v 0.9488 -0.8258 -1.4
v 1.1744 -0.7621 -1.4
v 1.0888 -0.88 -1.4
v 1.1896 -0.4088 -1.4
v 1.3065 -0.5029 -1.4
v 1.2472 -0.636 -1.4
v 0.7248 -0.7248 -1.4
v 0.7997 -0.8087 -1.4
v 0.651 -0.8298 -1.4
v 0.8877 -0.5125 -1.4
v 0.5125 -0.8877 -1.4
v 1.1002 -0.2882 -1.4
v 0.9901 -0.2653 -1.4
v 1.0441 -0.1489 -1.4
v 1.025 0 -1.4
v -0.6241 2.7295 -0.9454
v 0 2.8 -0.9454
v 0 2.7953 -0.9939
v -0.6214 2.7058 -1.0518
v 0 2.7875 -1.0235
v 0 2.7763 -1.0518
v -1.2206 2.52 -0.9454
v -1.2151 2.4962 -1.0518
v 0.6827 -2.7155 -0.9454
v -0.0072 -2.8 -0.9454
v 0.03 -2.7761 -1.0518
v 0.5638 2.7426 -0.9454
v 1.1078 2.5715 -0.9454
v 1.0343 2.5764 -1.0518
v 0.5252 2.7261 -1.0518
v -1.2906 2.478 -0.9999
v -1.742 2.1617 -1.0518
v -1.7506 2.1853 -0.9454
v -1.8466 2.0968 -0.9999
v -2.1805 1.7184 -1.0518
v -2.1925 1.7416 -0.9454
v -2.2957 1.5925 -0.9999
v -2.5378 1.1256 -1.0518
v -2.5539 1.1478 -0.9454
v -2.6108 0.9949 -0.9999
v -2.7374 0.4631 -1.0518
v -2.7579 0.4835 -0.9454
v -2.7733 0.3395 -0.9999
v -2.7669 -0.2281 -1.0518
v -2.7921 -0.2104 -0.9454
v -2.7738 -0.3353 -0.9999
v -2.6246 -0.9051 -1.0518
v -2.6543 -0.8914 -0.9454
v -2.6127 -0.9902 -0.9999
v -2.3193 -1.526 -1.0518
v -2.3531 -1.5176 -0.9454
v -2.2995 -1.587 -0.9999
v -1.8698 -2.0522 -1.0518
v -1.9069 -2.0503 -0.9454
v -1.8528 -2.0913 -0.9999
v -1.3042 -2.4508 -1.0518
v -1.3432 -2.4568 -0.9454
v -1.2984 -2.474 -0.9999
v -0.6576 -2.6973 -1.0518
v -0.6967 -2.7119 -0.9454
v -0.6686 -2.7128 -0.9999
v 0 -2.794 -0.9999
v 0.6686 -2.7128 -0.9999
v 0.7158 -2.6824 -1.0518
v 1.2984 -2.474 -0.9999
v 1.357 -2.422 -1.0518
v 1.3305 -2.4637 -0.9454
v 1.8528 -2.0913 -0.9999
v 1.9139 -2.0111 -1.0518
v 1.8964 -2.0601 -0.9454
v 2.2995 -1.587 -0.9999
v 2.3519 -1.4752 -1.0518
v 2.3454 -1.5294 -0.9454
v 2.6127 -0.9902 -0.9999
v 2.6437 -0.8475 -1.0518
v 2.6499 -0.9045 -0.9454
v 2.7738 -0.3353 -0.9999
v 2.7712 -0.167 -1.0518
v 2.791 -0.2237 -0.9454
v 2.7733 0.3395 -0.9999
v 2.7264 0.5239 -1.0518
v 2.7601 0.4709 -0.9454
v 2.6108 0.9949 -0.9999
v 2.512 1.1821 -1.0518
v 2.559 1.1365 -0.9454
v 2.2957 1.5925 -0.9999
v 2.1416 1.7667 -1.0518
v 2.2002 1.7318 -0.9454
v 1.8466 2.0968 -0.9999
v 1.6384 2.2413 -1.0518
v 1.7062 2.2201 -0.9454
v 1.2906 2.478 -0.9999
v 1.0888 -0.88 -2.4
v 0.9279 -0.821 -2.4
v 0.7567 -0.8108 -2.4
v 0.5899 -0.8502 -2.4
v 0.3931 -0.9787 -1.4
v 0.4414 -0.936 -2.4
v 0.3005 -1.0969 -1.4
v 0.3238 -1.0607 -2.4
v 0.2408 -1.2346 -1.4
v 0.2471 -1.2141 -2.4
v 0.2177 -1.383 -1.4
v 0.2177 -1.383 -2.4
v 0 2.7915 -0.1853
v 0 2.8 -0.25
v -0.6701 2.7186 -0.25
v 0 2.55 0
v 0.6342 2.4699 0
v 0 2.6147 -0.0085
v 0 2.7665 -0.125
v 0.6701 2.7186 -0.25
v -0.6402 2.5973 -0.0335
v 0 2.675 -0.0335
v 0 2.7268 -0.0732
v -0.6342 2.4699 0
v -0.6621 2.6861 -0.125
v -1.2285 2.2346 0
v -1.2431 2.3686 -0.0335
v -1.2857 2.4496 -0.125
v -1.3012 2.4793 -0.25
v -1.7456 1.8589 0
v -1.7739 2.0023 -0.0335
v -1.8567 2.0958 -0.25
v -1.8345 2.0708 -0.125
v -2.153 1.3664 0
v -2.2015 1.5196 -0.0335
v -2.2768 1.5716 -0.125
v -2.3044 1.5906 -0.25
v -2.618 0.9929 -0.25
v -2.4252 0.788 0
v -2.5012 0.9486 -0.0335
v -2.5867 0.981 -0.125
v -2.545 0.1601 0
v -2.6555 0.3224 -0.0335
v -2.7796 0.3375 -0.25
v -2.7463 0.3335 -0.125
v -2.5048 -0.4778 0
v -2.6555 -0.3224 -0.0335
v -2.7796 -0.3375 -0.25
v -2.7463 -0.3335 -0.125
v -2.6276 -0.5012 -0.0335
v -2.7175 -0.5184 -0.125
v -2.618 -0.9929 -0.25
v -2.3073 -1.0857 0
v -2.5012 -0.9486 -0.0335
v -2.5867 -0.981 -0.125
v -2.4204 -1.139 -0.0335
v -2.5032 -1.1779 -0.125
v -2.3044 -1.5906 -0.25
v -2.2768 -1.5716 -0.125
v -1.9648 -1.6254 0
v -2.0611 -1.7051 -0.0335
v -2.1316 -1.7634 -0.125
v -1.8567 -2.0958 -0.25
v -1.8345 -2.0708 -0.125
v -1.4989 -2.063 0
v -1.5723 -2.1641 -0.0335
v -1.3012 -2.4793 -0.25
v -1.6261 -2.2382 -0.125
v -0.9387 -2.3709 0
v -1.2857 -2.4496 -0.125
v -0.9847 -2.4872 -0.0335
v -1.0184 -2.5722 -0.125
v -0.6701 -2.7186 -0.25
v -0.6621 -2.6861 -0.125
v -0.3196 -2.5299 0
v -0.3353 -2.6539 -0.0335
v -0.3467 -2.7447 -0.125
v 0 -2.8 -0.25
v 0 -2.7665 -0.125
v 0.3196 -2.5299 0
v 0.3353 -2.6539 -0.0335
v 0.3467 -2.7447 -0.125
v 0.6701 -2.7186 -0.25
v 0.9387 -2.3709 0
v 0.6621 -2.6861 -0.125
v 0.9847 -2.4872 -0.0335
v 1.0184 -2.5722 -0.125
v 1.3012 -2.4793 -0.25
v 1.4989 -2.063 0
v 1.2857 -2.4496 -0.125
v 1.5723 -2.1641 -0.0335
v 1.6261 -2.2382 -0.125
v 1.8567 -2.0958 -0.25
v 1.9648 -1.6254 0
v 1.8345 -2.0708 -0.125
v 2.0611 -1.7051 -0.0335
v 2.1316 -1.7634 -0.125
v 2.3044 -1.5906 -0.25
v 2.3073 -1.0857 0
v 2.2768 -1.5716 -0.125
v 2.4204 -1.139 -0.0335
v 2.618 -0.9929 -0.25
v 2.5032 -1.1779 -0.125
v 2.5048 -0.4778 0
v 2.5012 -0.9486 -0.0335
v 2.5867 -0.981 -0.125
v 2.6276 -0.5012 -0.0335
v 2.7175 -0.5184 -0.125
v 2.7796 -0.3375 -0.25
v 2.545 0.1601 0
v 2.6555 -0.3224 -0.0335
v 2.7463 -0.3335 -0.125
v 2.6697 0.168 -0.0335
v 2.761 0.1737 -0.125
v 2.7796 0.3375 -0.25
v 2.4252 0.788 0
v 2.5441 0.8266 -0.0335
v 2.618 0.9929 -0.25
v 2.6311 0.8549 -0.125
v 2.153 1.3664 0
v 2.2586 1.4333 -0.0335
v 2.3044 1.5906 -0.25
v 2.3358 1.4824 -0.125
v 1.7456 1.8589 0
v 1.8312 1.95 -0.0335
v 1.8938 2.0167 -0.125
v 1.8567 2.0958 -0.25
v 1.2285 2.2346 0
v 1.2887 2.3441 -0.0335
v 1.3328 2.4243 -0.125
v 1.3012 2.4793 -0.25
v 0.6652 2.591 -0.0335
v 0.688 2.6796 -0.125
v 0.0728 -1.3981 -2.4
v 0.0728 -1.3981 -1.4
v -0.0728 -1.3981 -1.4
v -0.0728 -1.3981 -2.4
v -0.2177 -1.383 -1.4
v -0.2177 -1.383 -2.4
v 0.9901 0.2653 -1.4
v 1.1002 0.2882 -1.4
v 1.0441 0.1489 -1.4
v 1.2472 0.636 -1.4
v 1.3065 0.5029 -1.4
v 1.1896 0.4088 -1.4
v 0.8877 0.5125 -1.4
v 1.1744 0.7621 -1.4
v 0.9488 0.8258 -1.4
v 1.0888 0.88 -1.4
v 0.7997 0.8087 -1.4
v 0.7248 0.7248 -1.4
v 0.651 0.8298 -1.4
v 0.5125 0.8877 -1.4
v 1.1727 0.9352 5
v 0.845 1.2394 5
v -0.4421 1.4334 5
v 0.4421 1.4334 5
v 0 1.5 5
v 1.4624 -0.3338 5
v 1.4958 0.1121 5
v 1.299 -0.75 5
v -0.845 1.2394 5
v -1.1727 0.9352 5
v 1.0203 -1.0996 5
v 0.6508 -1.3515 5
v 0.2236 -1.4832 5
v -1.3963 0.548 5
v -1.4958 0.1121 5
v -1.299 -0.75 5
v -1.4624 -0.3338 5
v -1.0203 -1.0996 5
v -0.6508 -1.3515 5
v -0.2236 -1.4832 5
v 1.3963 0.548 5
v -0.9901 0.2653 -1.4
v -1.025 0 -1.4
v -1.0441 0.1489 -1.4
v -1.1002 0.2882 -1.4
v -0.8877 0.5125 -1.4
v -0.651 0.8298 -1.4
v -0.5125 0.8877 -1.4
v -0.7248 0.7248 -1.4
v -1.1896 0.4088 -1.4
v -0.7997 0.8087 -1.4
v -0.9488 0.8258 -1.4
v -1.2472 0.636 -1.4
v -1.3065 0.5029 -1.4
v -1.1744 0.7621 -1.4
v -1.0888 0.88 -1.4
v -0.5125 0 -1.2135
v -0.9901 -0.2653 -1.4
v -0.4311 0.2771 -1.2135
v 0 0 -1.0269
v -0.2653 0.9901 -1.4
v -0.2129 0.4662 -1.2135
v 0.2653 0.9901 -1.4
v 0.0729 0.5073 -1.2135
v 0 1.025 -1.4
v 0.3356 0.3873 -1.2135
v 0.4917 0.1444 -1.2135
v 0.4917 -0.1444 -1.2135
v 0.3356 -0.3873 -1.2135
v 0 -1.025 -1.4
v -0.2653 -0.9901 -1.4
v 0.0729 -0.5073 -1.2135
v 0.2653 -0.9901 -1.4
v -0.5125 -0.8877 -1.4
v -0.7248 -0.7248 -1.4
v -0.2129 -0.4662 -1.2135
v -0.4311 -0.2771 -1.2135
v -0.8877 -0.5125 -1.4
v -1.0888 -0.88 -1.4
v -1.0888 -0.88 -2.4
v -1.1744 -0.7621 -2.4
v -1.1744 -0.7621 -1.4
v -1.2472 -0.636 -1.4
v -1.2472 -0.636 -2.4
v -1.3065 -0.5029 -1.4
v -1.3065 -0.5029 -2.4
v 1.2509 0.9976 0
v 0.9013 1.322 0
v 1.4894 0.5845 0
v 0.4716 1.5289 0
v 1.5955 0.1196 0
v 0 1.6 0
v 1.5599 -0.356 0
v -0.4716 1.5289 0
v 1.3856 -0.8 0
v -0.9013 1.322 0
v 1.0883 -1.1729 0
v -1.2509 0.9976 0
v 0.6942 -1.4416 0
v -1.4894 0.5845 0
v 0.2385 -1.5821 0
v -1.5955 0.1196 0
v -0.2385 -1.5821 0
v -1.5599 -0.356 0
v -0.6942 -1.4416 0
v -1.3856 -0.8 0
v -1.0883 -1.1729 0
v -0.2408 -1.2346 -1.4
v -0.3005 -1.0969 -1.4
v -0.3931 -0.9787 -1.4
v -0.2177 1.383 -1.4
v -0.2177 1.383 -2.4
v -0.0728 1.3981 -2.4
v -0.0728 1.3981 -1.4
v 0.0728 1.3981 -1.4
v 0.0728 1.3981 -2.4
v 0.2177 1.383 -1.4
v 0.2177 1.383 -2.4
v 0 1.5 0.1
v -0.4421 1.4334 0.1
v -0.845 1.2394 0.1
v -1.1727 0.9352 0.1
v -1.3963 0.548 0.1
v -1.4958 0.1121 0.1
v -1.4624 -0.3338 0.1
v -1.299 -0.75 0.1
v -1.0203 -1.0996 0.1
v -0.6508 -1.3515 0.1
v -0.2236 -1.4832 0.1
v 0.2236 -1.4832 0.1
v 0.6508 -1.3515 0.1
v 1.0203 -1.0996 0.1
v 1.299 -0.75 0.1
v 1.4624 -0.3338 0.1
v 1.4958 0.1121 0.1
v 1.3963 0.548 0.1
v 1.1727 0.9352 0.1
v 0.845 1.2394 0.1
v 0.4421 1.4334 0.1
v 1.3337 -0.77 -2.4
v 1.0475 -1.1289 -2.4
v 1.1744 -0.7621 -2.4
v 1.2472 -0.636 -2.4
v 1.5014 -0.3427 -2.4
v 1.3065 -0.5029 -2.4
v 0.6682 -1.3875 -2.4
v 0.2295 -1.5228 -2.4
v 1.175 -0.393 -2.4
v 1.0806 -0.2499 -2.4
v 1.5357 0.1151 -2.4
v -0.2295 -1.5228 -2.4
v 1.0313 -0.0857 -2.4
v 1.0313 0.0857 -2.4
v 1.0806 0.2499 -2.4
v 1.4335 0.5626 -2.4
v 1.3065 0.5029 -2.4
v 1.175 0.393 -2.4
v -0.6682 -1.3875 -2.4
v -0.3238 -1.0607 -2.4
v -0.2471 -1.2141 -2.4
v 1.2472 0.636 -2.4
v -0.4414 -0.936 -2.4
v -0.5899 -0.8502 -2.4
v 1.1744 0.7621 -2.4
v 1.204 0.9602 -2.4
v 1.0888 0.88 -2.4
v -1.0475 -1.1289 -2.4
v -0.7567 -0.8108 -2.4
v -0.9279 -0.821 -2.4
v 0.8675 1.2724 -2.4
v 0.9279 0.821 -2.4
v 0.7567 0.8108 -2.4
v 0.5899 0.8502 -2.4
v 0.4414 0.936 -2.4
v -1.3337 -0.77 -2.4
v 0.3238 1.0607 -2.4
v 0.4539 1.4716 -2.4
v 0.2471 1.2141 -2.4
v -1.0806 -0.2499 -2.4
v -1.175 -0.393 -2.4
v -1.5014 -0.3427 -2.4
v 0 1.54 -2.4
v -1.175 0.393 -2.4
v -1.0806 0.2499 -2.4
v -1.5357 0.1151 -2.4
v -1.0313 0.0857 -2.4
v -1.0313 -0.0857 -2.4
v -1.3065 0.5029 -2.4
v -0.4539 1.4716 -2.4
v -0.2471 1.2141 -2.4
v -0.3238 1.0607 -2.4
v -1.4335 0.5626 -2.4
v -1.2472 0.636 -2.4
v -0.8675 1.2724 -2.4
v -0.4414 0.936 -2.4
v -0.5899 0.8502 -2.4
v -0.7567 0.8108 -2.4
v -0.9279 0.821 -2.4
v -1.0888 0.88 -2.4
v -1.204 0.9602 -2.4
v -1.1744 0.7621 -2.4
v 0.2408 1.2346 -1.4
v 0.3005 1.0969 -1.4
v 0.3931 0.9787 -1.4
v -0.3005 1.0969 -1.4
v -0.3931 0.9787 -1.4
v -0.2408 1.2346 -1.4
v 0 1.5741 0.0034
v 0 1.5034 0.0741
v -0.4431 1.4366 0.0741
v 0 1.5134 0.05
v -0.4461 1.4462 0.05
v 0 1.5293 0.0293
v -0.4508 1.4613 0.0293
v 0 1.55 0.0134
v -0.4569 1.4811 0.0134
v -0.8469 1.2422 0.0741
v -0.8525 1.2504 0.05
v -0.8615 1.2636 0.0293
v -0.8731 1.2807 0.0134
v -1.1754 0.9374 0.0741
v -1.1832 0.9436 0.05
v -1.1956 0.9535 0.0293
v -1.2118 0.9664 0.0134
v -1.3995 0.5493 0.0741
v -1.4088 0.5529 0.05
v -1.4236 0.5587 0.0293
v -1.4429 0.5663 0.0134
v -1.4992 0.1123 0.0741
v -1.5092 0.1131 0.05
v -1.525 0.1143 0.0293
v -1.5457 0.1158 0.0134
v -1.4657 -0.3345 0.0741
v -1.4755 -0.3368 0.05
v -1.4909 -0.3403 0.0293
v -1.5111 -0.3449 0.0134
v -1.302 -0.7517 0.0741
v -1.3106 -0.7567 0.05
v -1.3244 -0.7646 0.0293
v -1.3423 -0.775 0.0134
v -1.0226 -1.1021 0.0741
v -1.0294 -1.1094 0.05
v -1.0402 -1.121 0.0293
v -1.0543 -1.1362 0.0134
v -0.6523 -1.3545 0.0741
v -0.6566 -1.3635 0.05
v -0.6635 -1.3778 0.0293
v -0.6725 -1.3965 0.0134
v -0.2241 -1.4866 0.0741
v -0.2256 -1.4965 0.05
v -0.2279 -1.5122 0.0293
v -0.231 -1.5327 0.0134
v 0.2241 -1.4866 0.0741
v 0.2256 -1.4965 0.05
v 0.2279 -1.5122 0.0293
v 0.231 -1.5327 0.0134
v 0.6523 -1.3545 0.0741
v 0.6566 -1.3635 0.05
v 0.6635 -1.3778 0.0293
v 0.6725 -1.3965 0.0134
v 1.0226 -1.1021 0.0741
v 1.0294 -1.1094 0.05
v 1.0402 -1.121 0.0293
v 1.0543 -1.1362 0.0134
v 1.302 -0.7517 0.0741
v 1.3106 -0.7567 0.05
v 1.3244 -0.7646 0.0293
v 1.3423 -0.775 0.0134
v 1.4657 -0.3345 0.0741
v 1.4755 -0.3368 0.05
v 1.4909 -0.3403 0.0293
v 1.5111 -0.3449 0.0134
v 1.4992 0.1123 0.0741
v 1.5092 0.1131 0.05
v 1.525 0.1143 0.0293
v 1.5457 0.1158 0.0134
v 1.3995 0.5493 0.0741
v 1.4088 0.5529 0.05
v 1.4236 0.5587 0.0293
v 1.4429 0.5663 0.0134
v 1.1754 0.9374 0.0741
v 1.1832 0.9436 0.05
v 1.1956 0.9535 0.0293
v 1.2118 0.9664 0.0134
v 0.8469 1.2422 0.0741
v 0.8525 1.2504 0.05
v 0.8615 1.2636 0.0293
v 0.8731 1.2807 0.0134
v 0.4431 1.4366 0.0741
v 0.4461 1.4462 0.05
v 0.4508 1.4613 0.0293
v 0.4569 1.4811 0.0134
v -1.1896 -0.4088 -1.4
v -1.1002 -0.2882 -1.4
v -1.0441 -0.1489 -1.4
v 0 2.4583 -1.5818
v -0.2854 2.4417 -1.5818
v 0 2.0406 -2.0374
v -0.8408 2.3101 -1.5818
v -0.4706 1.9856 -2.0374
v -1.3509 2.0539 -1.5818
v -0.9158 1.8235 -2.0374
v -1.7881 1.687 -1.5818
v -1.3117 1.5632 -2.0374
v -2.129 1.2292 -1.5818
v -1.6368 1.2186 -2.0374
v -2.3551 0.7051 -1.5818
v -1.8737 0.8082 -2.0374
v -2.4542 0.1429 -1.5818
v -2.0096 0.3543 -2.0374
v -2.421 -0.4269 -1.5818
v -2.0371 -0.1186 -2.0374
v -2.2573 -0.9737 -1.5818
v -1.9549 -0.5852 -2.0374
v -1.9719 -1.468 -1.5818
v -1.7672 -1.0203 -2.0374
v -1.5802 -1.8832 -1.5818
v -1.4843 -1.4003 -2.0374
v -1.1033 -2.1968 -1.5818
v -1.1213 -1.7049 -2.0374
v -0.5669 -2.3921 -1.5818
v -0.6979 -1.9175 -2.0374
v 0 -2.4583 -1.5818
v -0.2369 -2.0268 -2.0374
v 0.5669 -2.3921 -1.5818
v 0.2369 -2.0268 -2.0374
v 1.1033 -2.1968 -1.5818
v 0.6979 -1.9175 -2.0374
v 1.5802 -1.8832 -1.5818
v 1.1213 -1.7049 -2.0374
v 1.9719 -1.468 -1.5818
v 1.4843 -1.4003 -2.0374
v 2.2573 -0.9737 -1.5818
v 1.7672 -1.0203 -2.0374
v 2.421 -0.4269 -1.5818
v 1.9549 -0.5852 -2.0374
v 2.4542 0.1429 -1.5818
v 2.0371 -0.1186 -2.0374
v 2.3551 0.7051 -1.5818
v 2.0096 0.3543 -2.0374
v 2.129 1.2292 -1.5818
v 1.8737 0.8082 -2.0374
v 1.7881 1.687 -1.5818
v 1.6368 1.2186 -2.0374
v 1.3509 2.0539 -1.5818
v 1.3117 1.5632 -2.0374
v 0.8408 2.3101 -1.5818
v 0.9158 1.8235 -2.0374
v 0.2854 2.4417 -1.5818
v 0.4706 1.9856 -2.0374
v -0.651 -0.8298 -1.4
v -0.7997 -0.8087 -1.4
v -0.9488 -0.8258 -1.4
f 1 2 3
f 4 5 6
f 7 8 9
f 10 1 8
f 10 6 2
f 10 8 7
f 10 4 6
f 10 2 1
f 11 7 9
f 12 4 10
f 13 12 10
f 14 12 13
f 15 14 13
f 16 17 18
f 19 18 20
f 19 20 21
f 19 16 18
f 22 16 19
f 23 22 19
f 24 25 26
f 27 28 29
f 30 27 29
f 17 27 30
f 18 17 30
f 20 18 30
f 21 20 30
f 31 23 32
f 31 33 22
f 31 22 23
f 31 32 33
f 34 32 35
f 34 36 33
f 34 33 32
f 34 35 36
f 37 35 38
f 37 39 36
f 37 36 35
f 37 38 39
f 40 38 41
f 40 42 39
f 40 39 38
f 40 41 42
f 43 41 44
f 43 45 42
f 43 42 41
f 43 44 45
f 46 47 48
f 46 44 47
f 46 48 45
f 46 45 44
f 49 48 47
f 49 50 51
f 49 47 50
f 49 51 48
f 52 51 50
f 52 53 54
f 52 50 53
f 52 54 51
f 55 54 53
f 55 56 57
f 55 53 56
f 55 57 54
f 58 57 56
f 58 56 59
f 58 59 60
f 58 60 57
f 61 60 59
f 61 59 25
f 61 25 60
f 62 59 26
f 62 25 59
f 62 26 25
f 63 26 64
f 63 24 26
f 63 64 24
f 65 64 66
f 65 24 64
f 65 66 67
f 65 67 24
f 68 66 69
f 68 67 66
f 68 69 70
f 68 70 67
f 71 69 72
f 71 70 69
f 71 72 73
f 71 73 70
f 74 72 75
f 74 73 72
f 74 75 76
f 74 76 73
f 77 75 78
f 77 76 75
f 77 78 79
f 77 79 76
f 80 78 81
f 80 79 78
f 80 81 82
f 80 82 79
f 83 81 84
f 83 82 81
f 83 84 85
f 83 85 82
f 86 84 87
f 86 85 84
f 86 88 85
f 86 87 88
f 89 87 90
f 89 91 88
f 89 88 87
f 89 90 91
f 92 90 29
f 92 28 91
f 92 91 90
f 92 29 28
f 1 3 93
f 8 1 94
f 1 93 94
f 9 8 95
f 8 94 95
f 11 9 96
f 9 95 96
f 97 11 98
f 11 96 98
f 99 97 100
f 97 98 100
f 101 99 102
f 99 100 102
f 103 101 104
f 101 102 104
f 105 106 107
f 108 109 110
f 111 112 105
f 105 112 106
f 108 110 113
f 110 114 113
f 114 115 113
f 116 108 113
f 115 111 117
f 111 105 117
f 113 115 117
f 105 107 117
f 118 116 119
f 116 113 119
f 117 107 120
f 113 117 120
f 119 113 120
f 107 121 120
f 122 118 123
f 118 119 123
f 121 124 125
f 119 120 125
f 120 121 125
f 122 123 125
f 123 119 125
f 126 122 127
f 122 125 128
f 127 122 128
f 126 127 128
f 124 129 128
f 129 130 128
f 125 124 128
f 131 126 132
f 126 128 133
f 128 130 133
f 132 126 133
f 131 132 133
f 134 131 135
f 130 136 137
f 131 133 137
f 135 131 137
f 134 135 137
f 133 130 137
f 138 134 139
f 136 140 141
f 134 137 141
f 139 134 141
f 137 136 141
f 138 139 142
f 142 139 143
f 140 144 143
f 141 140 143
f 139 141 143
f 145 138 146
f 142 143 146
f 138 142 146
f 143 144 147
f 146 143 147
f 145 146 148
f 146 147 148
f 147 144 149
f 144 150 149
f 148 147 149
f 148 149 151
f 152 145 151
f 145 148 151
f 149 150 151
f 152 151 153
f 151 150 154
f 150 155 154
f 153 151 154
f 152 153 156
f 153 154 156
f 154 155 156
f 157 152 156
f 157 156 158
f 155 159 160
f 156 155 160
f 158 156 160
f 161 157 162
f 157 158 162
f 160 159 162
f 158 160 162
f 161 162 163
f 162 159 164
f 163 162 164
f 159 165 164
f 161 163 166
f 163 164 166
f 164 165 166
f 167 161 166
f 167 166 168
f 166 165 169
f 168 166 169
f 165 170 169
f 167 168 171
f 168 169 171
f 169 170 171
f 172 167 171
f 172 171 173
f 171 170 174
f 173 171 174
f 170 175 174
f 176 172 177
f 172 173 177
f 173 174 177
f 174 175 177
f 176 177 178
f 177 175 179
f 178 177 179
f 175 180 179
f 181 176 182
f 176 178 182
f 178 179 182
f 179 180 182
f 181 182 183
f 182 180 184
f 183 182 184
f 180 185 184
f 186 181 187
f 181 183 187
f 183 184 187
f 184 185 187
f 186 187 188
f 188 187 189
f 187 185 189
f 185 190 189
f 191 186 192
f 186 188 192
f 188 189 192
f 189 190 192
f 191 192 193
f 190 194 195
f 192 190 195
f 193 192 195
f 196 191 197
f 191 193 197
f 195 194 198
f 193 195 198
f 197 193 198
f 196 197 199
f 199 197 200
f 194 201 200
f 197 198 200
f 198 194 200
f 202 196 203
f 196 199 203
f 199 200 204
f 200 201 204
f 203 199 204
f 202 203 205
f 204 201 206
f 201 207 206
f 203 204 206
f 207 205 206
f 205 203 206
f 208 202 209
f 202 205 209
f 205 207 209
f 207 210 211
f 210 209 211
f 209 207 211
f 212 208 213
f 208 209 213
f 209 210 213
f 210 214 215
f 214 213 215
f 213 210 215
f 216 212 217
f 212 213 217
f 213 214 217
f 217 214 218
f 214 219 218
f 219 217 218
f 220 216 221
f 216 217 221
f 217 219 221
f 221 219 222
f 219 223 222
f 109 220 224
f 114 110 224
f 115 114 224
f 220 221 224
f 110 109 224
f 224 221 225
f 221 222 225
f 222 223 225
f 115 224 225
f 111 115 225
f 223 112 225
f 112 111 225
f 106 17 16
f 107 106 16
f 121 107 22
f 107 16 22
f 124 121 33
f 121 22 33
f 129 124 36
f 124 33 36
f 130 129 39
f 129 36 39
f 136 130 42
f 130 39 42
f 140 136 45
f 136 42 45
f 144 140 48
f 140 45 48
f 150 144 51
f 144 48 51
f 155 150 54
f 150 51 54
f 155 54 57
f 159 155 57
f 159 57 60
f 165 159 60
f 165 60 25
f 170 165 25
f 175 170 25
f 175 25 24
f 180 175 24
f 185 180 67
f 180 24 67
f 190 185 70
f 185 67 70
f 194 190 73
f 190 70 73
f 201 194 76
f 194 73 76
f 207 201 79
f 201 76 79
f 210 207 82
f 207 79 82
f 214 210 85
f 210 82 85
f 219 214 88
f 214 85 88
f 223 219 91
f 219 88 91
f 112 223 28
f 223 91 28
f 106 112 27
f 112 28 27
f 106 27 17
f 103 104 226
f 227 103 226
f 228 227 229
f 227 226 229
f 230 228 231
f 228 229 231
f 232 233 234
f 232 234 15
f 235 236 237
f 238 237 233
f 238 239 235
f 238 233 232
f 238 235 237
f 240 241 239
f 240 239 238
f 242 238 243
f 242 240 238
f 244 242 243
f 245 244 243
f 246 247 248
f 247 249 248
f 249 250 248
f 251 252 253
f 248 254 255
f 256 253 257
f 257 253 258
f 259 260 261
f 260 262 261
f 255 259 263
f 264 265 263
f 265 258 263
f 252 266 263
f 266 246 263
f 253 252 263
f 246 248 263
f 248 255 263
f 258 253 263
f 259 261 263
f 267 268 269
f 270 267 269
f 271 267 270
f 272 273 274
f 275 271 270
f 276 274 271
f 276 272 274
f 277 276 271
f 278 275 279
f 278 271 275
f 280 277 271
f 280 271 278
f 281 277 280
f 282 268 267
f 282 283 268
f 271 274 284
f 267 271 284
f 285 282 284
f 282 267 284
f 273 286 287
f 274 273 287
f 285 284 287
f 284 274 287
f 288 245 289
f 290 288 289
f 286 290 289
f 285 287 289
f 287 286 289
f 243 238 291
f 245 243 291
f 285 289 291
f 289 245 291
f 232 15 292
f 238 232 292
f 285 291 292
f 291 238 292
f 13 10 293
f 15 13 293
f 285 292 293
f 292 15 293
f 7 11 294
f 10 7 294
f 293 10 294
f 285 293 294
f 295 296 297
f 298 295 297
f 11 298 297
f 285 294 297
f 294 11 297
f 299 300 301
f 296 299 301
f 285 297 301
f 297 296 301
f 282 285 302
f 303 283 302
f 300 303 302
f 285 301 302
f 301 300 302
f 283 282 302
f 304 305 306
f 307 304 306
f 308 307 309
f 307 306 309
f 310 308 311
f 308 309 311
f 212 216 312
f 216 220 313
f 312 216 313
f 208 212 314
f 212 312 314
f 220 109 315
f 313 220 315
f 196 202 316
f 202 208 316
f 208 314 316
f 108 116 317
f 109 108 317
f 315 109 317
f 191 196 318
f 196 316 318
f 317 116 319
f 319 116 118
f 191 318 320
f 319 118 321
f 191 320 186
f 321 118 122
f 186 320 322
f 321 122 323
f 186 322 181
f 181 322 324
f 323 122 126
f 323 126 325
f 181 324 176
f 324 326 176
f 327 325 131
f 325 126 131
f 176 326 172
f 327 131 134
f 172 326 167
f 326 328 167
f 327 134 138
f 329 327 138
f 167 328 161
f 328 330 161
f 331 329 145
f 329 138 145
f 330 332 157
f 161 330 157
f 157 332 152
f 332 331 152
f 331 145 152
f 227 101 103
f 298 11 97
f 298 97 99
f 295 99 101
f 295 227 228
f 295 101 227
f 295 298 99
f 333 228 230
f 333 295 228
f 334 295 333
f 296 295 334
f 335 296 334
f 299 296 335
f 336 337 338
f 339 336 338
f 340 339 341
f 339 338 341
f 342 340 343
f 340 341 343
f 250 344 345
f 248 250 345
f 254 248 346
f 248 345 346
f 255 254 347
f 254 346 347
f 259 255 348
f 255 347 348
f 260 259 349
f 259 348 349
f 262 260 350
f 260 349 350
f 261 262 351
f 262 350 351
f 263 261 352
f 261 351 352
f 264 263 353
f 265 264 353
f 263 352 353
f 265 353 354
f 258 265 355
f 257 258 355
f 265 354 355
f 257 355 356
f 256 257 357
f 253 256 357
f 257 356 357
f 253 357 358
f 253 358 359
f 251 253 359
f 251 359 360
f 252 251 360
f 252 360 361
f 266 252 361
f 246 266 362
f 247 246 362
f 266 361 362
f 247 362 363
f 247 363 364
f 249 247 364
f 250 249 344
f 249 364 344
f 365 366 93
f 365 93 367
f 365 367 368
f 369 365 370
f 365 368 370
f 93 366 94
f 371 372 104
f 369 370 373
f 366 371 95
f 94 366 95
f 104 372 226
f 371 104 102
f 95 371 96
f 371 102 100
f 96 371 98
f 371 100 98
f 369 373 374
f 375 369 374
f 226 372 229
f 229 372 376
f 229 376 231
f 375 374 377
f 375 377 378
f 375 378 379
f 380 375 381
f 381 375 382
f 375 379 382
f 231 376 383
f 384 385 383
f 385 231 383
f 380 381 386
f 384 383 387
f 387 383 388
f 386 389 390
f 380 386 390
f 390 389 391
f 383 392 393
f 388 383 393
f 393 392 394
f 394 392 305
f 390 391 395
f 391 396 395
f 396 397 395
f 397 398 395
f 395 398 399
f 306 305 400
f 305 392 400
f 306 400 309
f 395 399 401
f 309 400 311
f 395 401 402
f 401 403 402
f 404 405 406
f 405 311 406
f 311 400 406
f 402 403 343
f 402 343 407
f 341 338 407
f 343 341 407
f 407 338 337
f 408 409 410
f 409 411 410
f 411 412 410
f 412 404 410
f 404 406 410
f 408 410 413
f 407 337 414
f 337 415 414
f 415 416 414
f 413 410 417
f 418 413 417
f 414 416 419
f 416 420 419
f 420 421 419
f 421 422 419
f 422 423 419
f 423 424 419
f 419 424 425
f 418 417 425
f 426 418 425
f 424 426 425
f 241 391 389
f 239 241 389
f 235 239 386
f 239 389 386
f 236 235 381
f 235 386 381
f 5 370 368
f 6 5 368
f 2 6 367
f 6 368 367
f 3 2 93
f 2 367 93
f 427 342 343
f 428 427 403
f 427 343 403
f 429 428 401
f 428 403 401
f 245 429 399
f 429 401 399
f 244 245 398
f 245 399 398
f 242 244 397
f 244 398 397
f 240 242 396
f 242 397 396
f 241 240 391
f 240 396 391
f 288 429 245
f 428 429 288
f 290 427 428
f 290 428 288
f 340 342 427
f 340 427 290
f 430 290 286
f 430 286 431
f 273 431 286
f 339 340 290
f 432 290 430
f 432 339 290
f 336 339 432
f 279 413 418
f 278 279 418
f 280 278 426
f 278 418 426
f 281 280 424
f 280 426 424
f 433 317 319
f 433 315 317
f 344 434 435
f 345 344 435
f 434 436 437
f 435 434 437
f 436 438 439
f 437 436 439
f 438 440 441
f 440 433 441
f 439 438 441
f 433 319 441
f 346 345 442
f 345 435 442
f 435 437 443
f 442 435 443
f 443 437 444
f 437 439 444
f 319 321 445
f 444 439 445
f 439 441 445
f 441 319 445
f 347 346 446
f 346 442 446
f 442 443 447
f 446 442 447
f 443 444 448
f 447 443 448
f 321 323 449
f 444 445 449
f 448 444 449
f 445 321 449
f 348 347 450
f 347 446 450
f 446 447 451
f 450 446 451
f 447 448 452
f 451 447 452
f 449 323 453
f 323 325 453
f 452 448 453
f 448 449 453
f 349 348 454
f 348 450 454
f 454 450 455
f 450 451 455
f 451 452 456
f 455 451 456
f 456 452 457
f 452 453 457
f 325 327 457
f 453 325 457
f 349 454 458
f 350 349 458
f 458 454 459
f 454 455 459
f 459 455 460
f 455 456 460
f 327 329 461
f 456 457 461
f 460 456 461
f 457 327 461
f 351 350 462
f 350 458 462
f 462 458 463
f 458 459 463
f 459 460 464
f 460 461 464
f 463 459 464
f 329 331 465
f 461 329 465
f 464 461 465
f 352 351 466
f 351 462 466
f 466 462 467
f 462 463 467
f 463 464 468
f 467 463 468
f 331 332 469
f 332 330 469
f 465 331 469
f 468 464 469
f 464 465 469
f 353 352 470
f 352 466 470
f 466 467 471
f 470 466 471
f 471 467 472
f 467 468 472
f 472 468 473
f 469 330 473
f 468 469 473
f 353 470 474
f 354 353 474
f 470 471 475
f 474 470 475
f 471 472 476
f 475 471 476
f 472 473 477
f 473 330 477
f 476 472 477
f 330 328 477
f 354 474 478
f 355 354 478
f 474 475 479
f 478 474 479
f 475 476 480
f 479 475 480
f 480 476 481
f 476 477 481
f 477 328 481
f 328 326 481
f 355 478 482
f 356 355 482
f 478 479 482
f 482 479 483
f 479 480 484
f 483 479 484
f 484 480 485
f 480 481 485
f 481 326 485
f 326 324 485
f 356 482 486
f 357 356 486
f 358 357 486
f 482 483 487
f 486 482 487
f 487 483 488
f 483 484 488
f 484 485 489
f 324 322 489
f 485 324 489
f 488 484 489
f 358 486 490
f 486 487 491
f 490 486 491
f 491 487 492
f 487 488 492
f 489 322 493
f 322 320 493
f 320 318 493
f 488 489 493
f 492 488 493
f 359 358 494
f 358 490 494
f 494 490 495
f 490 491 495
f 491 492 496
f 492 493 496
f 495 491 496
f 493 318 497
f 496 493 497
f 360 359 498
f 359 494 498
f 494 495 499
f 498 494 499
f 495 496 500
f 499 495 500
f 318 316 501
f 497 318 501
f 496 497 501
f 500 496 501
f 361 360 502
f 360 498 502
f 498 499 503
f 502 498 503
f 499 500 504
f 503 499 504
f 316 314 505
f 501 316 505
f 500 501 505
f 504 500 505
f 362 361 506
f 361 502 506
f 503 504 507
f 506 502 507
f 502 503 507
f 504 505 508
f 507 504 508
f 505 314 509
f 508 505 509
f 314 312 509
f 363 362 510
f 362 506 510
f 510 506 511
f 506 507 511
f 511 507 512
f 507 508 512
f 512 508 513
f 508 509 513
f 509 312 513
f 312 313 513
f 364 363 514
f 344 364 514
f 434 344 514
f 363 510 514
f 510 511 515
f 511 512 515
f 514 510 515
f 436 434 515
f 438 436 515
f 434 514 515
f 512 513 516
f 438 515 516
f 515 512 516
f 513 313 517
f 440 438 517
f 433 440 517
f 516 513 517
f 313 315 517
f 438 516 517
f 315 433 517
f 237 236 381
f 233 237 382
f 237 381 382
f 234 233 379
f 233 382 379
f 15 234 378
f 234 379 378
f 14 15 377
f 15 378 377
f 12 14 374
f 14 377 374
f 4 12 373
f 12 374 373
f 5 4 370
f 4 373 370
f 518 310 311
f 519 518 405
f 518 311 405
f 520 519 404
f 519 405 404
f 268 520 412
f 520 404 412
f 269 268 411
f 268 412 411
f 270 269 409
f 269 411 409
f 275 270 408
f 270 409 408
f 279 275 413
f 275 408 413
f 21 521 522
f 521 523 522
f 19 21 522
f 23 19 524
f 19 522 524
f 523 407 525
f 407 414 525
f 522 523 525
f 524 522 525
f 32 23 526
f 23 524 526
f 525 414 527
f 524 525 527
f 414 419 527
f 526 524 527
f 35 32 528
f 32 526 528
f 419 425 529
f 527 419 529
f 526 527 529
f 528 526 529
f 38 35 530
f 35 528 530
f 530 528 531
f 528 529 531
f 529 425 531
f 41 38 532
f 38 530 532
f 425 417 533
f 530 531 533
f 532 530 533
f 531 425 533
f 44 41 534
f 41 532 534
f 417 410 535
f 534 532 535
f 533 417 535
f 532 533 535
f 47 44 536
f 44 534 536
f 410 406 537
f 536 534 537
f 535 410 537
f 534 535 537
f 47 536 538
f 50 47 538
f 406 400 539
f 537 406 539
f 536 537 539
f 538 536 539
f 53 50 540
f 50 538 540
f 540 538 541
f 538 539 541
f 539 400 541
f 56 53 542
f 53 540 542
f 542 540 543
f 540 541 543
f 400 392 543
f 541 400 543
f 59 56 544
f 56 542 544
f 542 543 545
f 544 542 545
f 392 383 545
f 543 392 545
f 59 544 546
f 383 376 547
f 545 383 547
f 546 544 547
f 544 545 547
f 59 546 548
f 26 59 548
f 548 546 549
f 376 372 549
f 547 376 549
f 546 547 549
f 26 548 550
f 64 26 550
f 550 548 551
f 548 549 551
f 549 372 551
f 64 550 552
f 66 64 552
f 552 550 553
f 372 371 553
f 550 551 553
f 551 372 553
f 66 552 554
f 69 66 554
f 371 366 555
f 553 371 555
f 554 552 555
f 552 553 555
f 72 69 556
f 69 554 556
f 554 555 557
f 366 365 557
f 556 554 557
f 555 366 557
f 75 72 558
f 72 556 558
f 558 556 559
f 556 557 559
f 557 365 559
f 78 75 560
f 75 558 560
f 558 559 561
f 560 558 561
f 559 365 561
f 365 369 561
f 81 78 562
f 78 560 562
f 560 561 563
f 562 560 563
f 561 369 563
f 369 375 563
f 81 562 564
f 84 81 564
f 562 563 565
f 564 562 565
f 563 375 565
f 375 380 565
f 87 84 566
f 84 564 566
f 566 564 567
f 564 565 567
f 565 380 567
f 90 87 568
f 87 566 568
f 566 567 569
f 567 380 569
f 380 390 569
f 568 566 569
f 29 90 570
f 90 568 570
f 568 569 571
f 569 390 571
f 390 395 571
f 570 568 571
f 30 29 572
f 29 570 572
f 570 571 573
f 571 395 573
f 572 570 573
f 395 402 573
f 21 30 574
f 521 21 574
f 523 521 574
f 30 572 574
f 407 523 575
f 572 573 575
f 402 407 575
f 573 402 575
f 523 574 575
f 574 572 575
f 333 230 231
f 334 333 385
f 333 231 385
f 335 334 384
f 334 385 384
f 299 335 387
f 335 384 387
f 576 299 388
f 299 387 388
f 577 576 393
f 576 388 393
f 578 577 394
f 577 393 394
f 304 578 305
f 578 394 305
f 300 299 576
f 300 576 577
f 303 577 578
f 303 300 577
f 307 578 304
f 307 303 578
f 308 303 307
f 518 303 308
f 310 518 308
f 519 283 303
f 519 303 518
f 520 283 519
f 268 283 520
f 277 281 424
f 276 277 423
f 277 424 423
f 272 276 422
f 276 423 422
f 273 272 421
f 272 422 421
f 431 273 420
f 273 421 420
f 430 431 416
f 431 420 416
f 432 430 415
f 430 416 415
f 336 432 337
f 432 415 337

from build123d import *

# Parameters (mm, degrees)
FILLET1_R          = 0.1
FILLET2_R          = 0.25
HOLE1_D            = 2.05
HOLE1_DEPTH        = 1
HOLE1_TIP          = 0.37306949
CUT_EXTRUDE1_DEPTH = 1


with BuildPart() as part:
    # Sketch1 → Base-Revolve (revolve)
    with BuildSketch(Plane(origin=(0, 0, 0), x_dir=(0, 0, -1), z_dir=(1, 0, 0))):
        with BuildLine():
            Line((-5, 0), (-5, 1.5))
            Line((-5, 1.5), (0, 1.5))
            Line((0, 1.5), (0, 2.8))
            Line((0, 2.8), (1, 2.8))
            ThreePointArc((1, 2.8), (1.799098682, 2.280109646), (2.4, 1.54))
            Line((2.4, 1.54), (2.4, 0))
            Line((2.4, 0), (-5, 0))
        make_face()
    revolve(axis=Axis((0, 0, -2.4), (0, 0, 1)))

    # Fillet1
    fillet1_edges = [part.edges().sort_by_distance(p)[0] for p in [
        (0, -1.5, 0),
    ]]
    fillet(fillet1_edges, radius=FILLET1_R)

    # Fillet2
    fillet2_edges = [part.edges().sort_by_distance(p)[0] for p in [
        (0, -2.8, -1),
        (0, -2.8, 0),
    ]]
    fillet(fillet2_edges, radius=FILLET2_R)

    # Hole1
    with Locations(Plane(origin=(0, 0, -2.4), x_dir=(-1, 0, 0), z_dir=(0, 0, -1))):
        with Locations((0, 0)):
            Hole(HOLE1_D / 2, depth=HOLE1_DEPTH)
            with Locations((0, 0, -(HOLE1_DEPTH + HOLE1_TIP / 2))):  # 140° drill point
                Cone(0, HOLE1_D / 2, HOLE1_TIP, mode=Mode.SUBTRACT)

    # Sketch4 → Cut-Extrude1 (cut)
    with BuildSketch(Plane(origin=(0, 0, -2.4), x_dir=(-1, 0, 0), z_dir=(0, 0, -1))):
        with BuildLine():
            ThreePointArc((1.088832331, -0.880025088), (1.212435565, -0.7), (1.306540248, -0.502943915))
            ThreePointArc((1.306540248, -0.502943915), (1.025, 0), (1.306540248, 0.502943915))
            ThreePointArc((1.306540248, 0.502943915), (1.212435565, 0.7), (1.088832331, 0.880025088))
            ThreePointArc((1.088832331, 0.880025088), (0.5125, 0.887676039), (0.217707917, 1.382969003))
            ThreePointArc((0.217707917, 1.382969003), (0, 1.4), (-0.217707917, 1.382969003))
            ThreePointArc((-0.217707917, 1.382969003), (-0.5125, 0.887676039), (-1.088832331, 0.880025088))
            ThreePointArc((-1.088832331, 0.880025088), (-1.212435565, 0.7), (-1.306540248, 0.502943915))
            ThreePointArc((-1.306540248, 0.502943915), (-1.025, 0), (-1.306540248, -0.502943915))
            ThreePointArc((-1.306540248, -0.502943915), (-1.212435565, -0.7), (-1.088832331, -0.880025088))
            ThreePointArc((-1.088832331, -0.880025088), (-0.5125, -0.887676039), (-0.217707917, -1.382969003))
            ThreePointArc((-0.217707917, -1.382969003), (0, -1.4), (0.217707917, -1.382969003))
            ThreePointArc((0.217707917, -1.382969003), (0.5125, -0.887676039), (1.088832331, -0.880025088))
        make_face()
    extrude(amount=-CUT_EXTRUDE1_DEPTH, mode=Mode.SUBTRACT)


solid = part.part
